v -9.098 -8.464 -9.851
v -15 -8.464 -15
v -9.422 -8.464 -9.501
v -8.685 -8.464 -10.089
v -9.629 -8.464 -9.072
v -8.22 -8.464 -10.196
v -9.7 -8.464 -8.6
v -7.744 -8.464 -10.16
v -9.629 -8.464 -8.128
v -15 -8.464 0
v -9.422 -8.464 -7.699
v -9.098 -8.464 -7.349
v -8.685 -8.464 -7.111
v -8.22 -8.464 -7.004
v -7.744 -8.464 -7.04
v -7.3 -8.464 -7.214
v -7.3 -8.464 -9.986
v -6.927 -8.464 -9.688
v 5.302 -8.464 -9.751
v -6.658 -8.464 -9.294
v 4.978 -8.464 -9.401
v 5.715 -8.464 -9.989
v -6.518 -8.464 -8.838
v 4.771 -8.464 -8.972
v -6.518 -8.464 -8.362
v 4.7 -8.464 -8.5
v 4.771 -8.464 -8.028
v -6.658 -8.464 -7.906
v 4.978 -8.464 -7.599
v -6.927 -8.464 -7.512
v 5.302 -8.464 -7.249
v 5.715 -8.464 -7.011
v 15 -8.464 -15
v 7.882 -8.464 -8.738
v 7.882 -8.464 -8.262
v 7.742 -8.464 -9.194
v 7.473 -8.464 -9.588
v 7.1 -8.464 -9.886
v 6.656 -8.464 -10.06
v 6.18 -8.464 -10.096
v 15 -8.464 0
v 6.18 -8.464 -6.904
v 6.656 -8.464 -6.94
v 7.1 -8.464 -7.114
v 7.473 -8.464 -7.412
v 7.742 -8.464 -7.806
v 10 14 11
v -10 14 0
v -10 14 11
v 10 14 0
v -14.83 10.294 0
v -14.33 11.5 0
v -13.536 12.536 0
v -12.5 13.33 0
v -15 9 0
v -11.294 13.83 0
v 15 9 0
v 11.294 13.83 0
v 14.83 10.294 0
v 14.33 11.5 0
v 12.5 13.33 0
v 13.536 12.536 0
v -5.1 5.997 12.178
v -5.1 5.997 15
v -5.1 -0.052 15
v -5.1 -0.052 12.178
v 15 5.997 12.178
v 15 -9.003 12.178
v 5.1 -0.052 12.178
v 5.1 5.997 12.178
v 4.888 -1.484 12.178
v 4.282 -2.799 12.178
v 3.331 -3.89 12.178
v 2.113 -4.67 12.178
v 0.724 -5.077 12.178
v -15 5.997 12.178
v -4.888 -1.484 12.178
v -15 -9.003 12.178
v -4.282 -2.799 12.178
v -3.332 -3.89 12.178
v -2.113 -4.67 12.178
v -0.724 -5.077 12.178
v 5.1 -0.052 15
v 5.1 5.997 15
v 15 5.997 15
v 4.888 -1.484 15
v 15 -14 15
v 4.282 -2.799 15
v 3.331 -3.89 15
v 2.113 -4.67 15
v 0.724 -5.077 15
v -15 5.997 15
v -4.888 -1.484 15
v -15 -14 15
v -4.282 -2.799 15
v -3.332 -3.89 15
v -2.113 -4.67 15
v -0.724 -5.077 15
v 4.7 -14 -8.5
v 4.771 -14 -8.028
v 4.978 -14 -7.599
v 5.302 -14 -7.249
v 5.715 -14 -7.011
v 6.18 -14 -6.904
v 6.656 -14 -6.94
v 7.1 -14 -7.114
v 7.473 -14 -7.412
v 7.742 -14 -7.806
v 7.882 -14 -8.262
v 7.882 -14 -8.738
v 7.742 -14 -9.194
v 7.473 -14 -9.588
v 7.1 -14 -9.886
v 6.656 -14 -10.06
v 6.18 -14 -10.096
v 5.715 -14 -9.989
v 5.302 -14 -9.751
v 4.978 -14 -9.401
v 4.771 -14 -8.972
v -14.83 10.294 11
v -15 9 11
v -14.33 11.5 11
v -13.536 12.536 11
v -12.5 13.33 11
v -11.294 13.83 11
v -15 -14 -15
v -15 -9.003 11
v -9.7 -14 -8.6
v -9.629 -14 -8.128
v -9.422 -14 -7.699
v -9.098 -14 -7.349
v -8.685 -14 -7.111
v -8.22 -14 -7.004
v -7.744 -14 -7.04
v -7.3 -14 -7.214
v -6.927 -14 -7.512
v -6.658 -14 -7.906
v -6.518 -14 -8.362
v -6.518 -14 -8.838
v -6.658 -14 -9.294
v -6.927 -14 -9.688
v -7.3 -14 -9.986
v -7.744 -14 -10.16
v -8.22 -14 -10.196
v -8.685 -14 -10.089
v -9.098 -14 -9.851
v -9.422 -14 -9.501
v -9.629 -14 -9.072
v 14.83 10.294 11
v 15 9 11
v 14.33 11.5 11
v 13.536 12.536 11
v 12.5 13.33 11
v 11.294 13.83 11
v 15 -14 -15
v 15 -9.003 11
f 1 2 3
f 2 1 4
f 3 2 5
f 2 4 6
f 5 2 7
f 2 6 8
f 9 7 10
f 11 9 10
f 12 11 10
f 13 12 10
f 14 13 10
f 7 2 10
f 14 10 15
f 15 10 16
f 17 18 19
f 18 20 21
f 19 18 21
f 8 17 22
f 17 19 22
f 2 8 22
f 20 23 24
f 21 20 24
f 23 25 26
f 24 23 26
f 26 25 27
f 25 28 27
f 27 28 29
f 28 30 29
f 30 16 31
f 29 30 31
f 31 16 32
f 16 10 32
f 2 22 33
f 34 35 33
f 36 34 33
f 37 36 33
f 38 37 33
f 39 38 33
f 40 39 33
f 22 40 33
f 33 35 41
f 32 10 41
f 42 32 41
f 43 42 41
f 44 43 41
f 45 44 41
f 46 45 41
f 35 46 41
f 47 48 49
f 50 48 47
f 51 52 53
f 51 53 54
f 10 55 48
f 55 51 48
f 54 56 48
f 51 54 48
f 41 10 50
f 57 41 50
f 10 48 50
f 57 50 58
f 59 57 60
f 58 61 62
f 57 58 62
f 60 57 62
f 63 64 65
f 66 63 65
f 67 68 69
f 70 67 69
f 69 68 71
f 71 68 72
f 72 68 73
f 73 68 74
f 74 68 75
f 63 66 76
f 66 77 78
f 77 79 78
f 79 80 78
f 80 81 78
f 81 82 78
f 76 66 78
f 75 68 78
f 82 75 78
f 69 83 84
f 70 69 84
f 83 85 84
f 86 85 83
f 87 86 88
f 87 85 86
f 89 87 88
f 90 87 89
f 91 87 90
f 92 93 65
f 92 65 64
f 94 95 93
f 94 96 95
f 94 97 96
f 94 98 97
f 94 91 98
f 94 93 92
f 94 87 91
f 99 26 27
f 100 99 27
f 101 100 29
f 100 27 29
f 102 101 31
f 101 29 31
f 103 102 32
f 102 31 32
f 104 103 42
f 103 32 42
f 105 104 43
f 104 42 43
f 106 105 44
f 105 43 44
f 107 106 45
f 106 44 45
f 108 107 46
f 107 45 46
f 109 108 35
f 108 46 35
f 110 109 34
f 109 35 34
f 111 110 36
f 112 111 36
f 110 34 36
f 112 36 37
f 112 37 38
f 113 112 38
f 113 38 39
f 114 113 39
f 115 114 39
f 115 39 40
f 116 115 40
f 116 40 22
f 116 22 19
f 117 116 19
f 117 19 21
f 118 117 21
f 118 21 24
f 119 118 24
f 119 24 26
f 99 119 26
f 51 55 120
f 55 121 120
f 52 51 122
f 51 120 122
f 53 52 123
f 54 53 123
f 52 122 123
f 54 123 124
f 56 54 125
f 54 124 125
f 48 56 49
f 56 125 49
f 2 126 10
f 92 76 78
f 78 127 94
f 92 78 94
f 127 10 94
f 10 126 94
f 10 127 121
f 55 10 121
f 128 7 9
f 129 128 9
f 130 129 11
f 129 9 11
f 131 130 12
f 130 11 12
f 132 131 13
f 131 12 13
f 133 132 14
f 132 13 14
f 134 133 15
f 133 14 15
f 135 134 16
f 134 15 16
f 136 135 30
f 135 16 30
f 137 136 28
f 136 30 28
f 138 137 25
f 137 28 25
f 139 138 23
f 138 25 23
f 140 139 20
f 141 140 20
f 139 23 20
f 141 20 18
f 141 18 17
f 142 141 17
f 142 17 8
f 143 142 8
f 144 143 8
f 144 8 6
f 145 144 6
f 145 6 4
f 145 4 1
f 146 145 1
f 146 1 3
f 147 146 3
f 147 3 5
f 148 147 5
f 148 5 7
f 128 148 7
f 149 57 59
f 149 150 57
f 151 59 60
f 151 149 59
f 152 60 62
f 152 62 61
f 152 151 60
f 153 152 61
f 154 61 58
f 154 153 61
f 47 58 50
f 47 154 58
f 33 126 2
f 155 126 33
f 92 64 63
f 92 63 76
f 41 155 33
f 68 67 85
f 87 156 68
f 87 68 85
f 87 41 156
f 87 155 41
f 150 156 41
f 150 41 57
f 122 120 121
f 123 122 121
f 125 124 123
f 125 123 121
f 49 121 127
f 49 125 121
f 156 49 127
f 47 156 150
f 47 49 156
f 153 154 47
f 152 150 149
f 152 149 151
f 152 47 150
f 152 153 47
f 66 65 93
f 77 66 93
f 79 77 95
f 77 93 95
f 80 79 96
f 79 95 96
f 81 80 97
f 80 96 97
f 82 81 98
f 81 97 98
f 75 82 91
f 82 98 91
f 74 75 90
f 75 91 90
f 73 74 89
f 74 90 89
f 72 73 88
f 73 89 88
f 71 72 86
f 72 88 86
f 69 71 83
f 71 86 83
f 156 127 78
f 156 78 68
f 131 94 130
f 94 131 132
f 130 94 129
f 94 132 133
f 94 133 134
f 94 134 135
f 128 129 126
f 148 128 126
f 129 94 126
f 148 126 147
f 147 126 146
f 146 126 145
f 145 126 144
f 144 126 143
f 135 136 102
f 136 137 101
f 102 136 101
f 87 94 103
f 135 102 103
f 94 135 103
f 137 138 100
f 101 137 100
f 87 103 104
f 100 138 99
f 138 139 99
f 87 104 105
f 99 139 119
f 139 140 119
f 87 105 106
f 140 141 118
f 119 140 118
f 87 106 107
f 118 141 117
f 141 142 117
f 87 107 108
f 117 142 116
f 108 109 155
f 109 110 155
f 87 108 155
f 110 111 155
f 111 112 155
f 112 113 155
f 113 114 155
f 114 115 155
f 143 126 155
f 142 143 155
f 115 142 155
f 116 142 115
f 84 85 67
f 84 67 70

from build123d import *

# Parameters (mm, degrees)
F0_W      = 30
F0_H      = 28
F1_DEPTH  = 11
F2_R      = 5
F3_W      = 30
F3_H      = 5.535902
F4_DEPTH  = 15
F5_R      = 1.6
F6_DEPTH  = 16
F7_W      = 30
F7_H      = 4.997426
F8_DEPTH  = 4
F9_W      = 30
F9_H      = 2.822344
F10_DEPTH = 15
F12_DEPTH = 3


with BuildPart() as f1:
    # F0 (on Top) → F1 (new body)
    with BuildSketch(Plane.XY):
        Rectangle(F0_W, F0_H)
    extrude(amount=F1_DEPTH)

    # F2
    f2_edges = [f1.edges().sort_by_distance(p)[0] for p in [
        (15, 14, 5.5),
        (-15, 14, 5.5),
    ]]
    fillet(f2_edges, radius=F2_R)

    # F3 (on face) → F4 (join)
    with BuildSketch(Plane(origin=(0, 0, 0), x_dir=(1, 0, 0), z_dir=(0, 0, -1))):
        with Locations((0, 11.232049)):
            Rectangle(F3_W, F3_H)
    extrude(amount=F4_DEPTH)

    # F5 (on face) → F6 (cut)
    with BuildSketch(Plane(origin=(0, -8.464098, 0), x_dir=(-1, 0, 0), z_dir=(0, 1, 0))):
        with Locations((-6.3, -8.5)):
            Circle(F5_R)
        with Locations((8.1, -8.6)):
            Circle(F5_R)
    extrude(amount=-F6_DEPTH, mode=Mode.SUBTRACT)

    # F7 (on face) → F8 (join)
    with BuildSketch(Plane.XY.offset(11)):
        with Locations((0, -11.501287)):
            Rectangle(F7_W, F7_H)
    extrude(amount=F8_DEPTH)

    # F9 (on face) → F10 (join)
    with BuildSketch(Plane(origin=(0, -9.002574, 0), x_dir=(-1, 0, 0), z_dir=(0, 1, 0))):
        with Locations((0, 13.588828)):
            Rectangle(F9_W, F9_H)
    extrude(amount=F10_DEPTH)

    # F11 (on face) → F12 (cut)
    with BuildSketch(Plane.XY.offset(15)):
        with BuildLine():
            Line((-5.1, 5.647501), (-5.1, -0.052499))
            ThreePointArc((-5.1, -0.052499), (-5.6e-05, -5.128539), (5.099887, -0.052499))
            Line((5.099887, -0.052499), (5.099887, 5.647501))
            Line((5.099887, 5.647501), (5.099887, 5.997426))
            Line((5.099887, 5.997426), (-5.1, 5.997426))
            Line((-5.1, 5.997426), (-5.1, 5.647501))
        make_face()
    extrude(amount=-F12_DEPTH, mode=Mode.SUBTRACT)


solid = f1.part
